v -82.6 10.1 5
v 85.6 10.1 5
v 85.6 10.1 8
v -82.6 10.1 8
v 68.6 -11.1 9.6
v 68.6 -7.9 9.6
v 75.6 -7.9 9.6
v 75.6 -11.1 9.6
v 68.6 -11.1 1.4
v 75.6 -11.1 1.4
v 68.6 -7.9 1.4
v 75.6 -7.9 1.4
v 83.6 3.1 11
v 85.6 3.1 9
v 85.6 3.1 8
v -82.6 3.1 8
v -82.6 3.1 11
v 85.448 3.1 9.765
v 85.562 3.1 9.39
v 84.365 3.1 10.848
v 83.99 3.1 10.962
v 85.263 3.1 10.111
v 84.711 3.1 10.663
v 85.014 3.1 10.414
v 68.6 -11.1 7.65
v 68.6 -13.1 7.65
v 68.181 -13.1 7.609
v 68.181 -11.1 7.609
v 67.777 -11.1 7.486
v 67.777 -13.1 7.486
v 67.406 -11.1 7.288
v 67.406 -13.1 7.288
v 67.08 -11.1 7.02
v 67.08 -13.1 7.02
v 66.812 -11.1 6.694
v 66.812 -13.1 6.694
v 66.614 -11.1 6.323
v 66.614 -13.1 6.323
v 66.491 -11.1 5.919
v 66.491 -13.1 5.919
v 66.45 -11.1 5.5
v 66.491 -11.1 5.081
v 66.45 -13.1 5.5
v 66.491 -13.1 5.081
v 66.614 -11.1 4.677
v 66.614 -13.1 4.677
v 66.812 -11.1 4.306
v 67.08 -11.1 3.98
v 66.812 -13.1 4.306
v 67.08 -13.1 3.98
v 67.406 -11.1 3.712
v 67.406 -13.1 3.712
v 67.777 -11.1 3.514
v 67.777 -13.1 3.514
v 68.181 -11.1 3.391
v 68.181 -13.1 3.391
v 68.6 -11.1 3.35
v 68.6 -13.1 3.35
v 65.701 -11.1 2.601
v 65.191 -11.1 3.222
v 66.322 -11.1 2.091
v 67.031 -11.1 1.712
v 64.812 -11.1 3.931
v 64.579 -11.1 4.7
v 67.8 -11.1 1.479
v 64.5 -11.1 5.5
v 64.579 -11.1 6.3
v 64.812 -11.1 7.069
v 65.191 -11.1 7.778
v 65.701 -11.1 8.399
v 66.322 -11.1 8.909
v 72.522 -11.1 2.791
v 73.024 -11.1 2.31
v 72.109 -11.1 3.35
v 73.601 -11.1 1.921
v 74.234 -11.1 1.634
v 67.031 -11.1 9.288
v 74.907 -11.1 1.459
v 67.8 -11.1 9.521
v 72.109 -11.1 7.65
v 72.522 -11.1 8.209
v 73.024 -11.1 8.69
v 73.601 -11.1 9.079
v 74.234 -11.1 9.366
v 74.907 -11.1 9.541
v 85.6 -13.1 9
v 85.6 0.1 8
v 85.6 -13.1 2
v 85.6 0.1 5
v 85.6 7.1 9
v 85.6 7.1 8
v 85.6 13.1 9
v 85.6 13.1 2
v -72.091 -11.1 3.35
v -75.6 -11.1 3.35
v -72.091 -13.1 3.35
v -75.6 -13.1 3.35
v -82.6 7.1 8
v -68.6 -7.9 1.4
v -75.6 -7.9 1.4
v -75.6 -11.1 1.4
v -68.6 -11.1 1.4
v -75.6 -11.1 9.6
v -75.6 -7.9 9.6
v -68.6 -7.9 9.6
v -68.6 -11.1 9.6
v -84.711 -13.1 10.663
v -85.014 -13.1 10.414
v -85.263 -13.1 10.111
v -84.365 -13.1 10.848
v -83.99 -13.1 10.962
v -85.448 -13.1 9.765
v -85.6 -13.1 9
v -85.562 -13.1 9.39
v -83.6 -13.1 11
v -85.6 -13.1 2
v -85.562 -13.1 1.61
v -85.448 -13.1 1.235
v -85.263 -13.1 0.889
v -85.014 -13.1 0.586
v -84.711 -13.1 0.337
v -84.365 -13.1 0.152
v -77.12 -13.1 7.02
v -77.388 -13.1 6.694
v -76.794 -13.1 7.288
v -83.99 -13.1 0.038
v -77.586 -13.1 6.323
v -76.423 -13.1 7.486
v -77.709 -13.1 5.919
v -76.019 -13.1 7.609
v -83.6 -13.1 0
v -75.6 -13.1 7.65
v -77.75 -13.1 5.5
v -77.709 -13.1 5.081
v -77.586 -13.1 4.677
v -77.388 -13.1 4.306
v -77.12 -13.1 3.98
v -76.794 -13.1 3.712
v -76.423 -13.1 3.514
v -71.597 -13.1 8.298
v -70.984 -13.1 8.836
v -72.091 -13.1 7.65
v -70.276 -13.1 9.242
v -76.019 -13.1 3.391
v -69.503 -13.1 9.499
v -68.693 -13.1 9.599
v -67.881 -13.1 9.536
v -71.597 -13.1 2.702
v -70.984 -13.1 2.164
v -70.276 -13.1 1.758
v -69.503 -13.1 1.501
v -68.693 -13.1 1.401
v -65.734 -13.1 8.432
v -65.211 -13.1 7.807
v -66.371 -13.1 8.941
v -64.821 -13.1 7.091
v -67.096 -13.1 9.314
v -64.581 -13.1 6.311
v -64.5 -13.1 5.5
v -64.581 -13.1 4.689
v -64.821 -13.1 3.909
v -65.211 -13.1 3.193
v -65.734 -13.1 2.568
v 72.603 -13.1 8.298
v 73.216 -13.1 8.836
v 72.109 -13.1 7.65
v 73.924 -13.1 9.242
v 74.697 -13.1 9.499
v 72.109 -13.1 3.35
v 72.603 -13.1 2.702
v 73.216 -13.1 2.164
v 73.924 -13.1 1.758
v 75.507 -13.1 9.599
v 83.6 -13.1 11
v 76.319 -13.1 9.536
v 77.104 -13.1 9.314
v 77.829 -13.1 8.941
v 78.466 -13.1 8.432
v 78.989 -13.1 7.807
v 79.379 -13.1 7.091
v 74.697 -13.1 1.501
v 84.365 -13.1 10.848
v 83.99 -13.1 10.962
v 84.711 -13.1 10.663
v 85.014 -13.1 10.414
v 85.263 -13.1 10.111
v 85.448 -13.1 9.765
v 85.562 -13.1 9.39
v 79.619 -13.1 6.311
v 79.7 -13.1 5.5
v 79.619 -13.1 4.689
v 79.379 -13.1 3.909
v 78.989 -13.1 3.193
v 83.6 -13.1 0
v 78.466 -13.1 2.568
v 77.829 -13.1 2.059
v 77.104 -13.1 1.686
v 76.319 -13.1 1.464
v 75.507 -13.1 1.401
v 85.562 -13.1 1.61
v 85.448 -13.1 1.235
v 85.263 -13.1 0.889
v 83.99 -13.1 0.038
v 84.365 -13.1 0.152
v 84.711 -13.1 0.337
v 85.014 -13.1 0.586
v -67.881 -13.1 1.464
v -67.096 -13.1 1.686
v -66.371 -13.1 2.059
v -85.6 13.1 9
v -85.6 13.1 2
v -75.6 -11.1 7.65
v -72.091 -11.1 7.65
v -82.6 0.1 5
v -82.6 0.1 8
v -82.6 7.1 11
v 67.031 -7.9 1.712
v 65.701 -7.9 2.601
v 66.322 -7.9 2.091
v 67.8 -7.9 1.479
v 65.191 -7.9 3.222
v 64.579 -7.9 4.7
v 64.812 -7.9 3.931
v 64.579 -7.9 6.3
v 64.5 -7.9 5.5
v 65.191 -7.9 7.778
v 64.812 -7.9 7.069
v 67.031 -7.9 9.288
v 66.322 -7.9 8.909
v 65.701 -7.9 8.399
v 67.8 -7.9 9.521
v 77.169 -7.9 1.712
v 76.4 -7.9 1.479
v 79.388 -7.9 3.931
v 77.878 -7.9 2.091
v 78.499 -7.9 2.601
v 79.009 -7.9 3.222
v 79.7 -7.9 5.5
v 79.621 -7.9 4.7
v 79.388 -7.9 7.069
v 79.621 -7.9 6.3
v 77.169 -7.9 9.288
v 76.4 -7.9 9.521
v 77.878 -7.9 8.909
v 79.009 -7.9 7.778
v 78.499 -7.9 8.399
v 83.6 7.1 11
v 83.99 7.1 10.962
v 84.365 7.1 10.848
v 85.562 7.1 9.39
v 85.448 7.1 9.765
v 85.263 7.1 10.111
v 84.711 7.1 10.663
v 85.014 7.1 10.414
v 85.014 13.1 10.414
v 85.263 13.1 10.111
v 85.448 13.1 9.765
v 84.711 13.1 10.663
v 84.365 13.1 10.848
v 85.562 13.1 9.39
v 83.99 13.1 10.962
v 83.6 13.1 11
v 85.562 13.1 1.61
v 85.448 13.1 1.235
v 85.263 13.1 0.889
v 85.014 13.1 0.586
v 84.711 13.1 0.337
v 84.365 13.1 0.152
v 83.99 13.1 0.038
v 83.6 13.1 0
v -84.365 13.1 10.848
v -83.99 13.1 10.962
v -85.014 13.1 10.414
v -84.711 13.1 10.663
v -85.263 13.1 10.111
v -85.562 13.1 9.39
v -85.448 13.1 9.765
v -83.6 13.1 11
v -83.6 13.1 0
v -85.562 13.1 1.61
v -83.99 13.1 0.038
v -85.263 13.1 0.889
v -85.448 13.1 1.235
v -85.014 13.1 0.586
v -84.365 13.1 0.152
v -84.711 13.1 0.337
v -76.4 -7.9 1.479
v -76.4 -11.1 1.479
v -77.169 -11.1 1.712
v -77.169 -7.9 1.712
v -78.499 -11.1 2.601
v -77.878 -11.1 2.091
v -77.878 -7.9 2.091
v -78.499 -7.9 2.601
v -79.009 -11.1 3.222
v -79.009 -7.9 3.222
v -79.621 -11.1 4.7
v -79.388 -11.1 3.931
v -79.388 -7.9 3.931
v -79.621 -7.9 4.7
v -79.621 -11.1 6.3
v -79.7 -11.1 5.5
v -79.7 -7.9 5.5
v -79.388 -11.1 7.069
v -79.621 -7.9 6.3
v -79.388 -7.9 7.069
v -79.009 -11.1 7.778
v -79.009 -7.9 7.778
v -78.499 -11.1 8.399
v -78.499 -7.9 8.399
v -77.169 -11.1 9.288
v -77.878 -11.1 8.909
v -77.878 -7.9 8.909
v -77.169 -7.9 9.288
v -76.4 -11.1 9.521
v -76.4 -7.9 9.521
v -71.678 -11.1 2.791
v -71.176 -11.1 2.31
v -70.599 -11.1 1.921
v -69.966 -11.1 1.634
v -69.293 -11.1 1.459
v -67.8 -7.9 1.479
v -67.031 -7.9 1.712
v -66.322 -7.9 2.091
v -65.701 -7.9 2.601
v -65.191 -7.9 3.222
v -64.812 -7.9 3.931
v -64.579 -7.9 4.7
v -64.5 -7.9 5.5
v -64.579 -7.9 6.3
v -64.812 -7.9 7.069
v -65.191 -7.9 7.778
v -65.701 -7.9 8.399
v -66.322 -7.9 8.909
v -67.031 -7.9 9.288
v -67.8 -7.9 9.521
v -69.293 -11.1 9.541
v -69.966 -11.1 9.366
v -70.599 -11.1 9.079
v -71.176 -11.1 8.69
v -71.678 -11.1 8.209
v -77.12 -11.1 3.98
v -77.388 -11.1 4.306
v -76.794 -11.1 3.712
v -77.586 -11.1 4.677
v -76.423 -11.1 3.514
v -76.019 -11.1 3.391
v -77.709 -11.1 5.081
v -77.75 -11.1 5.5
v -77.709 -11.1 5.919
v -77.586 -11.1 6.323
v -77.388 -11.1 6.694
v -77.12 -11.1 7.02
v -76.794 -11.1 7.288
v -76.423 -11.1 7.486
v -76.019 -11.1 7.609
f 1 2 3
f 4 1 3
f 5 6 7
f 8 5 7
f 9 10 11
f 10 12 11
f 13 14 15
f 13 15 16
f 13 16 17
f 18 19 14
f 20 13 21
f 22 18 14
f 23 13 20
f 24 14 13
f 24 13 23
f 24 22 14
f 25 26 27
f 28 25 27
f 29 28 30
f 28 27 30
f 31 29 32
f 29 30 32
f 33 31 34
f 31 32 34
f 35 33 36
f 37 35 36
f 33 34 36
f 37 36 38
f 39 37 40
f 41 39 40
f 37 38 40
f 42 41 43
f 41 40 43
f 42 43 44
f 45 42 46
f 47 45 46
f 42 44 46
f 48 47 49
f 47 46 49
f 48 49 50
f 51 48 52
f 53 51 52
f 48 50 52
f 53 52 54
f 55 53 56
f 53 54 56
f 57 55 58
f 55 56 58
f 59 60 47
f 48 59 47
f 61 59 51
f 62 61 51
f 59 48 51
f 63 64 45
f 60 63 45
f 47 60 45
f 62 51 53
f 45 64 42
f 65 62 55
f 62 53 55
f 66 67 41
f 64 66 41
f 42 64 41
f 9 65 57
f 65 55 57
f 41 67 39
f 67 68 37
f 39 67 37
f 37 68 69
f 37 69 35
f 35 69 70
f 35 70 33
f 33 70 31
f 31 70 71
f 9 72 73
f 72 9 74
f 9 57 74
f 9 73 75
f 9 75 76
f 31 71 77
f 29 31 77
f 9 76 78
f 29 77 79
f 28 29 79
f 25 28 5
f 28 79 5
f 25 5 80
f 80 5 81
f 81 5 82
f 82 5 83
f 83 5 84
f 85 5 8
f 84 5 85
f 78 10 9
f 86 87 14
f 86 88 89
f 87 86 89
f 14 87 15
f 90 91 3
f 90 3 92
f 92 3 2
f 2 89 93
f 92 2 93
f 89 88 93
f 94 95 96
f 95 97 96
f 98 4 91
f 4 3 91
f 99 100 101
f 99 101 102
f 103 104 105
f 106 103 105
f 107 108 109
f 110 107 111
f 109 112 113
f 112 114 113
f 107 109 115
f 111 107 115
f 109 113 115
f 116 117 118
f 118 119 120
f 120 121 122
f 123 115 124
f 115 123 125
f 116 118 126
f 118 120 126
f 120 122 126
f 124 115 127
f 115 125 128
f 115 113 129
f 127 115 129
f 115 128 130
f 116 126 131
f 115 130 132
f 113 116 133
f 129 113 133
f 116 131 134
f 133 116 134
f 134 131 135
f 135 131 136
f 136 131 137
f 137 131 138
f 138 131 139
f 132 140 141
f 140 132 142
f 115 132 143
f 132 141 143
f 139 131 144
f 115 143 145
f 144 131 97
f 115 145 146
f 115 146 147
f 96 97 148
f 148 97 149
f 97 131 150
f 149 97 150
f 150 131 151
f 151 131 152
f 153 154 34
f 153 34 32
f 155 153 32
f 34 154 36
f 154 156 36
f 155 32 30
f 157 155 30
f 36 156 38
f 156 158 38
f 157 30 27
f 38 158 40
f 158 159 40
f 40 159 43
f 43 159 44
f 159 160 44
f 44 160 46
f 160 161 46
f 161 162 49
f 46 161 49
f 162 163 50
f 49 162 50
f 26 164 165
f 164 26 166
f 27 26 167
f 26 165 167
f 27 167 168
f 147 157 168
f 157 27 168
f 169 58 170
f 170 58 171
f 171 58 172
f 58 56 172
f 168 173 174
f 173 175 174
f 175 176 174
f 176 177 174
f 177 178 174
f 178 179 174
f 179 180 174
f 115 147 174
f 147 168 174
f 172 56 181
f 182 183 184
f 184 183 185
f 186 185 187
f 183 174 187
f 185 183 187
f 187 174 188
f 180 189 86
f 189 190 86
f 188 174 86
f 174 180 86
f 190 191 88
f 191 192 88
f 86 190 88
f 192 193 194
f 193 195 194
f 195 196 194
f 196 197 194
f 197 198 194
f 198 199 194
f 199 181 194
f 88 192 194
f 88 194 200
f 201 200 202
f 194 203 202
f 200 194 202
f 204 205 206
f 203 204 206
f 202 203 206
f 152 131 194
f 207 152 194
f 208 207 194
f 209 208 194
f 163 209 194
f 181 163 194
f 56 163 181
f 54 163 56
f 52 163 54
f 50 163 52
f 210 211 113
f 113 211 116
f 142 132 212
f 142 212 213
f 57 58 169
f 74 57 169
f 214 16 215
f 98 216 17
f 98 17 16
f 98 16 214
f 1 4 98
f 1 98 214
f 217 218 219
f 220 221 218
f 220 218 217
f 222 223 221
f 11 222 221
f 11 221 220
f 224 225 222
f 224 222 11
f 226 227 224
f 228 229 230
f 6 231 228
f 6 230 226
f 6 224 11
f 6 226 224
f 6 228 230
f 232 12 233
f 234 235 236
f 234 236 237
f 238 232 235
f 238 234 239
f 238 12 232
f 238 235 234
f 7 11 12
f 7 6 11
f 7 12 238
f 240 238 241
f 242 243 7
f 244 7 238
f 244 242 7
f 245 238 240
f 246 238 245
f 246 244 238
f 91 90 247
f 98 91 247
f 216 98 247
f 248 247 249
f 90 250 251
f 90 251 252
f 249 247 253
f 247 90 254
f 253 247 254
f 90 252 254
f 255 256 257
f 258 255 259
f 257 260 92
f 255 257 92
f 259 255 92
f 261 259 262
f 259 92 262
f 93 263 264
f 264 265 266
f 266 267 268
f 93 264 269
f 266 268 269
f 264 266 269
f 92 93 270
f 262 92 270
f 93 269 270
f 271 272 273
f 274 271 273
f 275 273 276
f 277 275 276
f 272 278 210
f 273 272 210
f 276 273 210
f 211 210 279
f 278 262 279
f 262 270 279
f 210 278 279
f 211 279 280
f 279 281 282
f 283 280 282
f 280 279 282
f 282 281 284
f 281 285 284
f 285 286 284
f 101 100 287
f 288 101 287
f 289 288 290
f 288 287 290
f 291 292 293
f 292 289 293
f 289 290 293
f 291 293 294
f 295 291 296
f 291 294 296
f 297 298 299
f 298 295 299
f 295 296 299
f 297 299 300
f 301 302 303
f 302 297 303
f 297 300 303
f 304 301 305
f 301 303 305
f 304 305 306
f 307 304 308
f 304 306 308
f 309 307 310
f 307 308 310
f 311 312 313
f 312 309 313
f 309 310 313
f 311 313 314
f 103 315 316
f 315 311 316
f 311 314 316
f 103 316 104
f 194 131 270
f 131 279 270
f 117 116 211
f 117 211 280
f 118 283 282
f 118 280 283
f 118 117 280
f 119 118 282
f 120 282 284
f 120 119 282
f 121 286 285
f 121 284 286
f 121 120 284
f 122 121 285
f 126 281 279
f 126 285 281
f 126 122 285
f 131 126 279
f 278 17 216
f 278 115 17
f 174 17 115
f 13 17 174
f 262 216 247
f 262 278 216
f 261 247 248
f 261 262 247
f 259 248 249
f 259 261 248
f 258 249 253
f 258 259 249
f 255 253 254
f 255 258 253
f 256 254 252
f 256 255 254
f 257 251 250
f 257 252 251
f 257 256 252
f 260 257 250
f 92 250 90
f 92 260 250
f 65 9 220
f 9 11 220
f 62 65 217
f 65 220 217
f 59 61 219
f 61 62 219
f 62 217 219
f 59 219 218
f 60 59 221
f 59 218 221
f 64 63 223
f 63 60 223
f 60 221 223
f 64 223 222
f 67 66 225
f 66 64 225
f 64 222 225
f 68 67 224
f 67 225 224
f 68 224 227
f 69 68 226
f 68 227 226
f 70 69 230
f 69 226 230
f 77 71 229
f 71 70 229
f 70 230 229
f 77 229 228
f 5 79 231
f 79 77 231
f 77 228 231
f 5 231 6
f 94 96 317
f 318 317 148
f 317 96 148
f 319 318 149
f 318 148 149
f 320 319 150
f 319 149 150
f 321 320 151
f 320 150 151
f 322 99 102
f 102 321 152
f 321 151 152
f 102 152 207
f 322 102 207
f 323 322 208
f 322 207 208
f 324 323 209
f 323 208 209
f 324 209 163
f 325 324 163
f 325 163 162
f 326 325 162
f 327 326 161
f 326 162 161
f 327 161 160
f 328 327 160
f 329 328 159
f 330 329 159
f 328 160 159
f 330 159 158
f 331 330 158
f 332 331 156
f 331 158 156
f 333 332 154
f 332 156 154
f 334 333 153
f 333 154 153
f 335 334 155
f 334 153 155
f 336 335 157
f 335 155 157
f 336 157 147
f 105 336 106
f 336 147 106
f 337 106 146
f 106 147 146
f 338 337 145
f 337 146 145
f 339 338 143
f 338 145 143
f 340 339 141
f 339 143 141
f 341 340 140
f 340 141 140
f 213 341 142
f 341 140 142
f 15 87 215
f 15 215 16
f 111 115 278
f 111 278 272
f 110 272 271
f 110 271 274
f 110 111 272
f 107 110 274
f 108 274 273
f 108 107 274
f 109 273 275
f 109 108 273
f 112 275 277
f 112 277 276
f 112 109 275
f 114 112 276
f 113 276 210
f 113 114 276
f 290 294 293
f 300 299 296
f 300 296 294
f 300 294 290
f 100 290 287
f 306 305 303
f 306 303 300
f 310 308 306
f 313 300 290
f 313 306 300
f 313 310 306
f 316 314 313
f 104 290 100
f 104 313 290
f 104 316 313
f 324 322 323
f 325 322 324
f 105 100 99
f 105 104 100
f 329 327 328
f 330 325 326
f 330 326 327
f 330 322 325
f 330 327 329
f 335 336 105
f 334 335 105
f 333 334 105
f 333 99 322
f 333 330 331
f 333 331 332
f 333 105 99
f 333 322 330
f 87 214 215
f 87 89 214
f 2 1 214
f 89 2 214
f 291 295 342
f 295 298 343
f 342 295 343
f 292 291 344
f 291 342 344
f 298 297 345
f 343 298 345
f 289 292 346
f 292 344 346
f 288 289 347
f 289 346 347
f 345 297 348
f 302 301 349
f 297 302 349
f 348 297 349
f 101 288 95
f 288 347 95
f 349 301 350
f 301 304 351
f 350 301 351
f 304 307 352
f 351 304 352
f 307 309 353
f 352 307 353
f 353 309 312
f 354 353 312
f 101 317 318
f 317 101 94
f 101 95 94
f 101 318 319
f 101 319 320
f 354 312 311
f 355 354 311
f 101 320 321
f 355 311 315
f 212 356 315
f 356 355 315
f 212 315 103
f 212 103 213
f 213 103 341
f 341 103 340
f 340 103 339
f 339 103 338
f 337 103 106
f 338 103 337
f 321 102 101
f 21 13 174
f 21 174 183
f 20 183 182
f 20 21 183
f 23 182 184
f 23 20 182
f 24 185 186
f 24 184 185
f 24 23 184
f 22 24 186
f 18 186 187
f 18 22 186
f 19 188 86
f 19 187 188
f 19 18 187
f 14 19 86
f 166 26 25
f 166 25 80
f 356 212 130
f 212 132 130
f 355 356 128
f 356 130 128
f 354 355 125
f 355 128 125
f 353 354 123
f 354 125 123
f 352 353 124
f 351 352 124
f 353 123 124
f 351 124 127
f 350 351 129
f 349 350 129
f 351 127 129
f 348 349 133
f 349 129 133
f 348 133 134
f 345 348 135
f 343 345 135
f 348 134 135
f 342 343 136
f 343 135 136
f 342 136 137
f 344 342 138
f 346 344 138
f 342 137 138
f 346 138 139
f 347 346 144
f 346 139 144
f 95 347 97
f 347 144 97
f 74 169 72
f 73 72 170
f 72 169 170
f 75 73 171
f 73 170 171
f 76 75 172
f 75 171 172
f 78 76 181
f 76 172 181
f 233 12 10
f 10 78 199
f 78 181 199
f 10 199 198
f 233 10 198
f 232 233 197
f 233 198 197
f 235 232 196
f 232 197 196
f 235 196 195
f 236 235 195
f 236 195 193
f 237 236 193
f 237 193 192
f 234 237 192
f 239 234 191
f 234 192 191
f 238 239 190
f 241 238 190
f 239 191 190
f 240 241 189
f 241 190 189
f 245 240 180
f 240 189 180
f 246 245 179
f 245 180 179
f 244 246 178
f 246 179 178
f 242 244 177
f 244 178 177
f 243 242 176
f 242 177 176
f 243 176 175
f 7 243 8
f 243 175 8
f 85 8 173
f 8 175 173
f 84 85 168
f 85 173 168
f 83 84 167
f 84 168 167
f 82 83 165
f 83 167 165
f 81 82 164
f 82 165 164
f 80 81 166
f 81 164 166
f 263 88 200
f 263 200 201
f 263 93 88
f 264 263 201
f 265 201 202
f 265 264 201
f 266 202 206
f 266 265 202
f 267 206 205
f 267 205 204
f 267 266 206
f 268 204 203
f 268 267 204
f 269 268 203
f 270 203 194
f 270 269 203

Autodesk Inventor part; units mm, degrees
ref_plane "YZ Plane" through (0, 0, 0) normal (1, 0, 0) x (0, 1, 0)
ref_plane "XZ Plane" through (0, 0, 0) normal (0, 1, 0) x (-1, 0, 0)
ref_plane "XY Plane" through (0, 0, 0) normal (0, 0, 1) x (1, 0, 0)
sketch "Sketch1" plane through (0, 0, 0) normal (0, 0, 1) x (1, 0, 0)
  line L0 (85.6, 13.1) -> (-85.6, 13.1)
  line L1 (-85.6, 13.1) -> (-85.6, -13.1)
  line L2 (-85.6, -13.1) -> (85.6, -13.1)
  line L3 (85.6, -13.1) -> (85.6, 13.1)
  line L4 (85.6, 13.1) -> (-85.6, -13.1) construction
  line L5 (-85.6, 13.1) -> (85.6, -13.1) construction
  point P0 (0, 0)
  dimension "d0" = 171.2
  dimension "d1" = 26.2
extrude "Extrusion1" add sketch "Sketch1" along normal blind 11
sketch "Sketch2" plane through (85.6, -13.1, 0) normal (1, 0, 0) x (0, 0, -1)
  line L0 (0, 0) -> (0, 26.2) projected
  line L1 (0, 26.2) -> (-11, 26.2) projected
  line L2 (-11, 0) -> (-11, 26.2) projected
  line L3 (0, 0) -> (-11, 0) projected
  line L4 (-11, 26.2) -> (-11, 0) projected
  line L5 (-11, 26.2) -> (-5, 26.2)
  line L6 (-5, 26.2) -> (-5, 23.2)
  line L7 (-5, 23.2) -> (-11, 23.2)
  line L8 (-11, 23.2) -> (-11, 26.2)
  line L9 (-11, 23.2) -> (-8, 23.2)
  line L10 (-8, 23.2) -> (-8, 20.2)
  line L11 (-8, 20.2) -> (-11, 20.2)
  line L12 (-11, 20.2) -> (-11, 23.2)
  line L13 (-11, 26.2) -> (-5, 26.2)
  line L14 (-5, 26.2) -> (-5, 10.2)
  line L15 (-5, 10.2) -> (-11, 10.2)
  line L16 (-11, 10.2) -> (-11, 26.2)
  line L17 (-11, 10.2) -> (-5, 10.2)
  line L18 (-5, 10.2) -> (-5, 13.2)
  line L19 (-5, 13.2) -> (-11, 13.2)
  line L20 (-11, 13.2) -> (-11, 10.2)
  line L21 (-11, 13.2) -> (-8, 13.2)
  line L22 (-8, 13.2) -> (-8, 16.2)
  line L23 (-8, 16.2) -> (-11, 16.2)
  line L24 (-11, 16.2) -> (-11, 13.2)
  point P0 (0, 13.1)
  point P1 (-11, 20.2)
  dimension "d4" = 6
  dimension "d5" = 3
  dimension "d6" = 3
  dimension "d7" = 3
  dimension "d8" = 16
  dimension "d9" = 3
  dimension "d10" = 3
  dimension "d11" = 3
extrude "Extrusion2" cut sketch "Sketch2" against normal blind 168.2 contours L14 L19 L22 L23 L2 L11 L10 L7
fillet "Fillet1" radius 2 5 edges at (85.6, 10.1, 11) (85.6, -5, 11) (-85.6, 0, 11) (85.6, 0, 0) (-85.6, 0, 0)
sketch "Sketch4" plane through (-83.6, -13.1, 0) normal (0, -1, 0) x (1, 0, 0)
  arc A0 (-2, 2) -> (0, 0) centre (0, 2) ccw projected
  line L0 (0, 0) -> (167.2, 0) projected
  arc A1 (167.2, 0) -> (169.2, 2) centre (167.2, 2) ccw projected
  line L1 (169.2, 2) -> (169.2, 9) projected
  arc A2 (169.2, 9) -> (167.2, 11) centre (167.2, 9) ccw projected
  line L2 (0, 11) -> (167.2, 11) projected
  arc A3 (0, 11) -> (-2, 9) centre (0, 9) ccw projected
  line L3 (-2, 2) -> (-2, 9) projected
  circle A4 centre (159.2, 5.5) radius 4.1
  circle A5 centre (152.2, 5.5) radius 2.15
  line L4 (152.2, 7.65) -> (155.7089, 7.65)
  line L5 (152.2, 3.35) -> (155.7089, 3.35)
  circle A6 centre (15, 5.5) radius 4.1
  circle A7 centre (8, 5.5) radius 2.15
  line L6 (8, 3.35) -> (11.5089, 3.35)
  line L7 (8, 7.65) -> (11.5089, 7.65)
  point P0 (83.6, 0)
  point P1 (169.2, 5.5)
  point P2 (12.2407, 8.5325)
  point P3 (8.4381, 3.3951)
  point P4 (11.1965, 3.9692)
  point P5 (-2, 5.5)
  dimension "d19" = 8.2
  dimension "d20" = 4.3
  dimension "d21" = 7
  dimension "d22" = 0
  dimension "d23" = 10
  dimension "d24" = 8.2
  dimension "d25" = 4.3
  dimension "d26" = 7
  dimension "d27" = 10
  dimension "d28" = 0
  dimension "d40" = 0
extrude "Extrusion4" cut sketch "Sketch4" against normal blind 5.2 contours A4 | A4 L5 A5 L4 | A5 | A6 | A6 L6 A7 L7 | A7
sketch "Sketch5" plane through (-83.6, -13.1, 0) normal (0, -1, 0) x (1, 0, 0)
  arc A0 (8, 7.65) -> (8, 3.35) centre (8, 5.5) ccw projected
  arc A1 (11.5089, 3.35) -> (11.5089, 7.65) centre (15, 5.5) ccw projected
  arc A2 (152.2, 7.65) -> (152.2, 3.35) centre (152.2, 5.5) ccw projected
  line L0 (152.2, 7.65) -> (155.7089, 7.65) projected
  arc A3 (155.7089, 3.35) -> (155.7089, 7.65) centre (159.2, 5.5) ccw projected
  line L1 (155.7089, 3.35) -> (152.2, 3.35) projected
  arc A4 (-2, 2) -> (0, 0) centre (0, 2) ccw projected
  line L2 (0, 0) -> (167.2, 0) projected
  arc A5 (167.2, 0) -> (169.2, 2) centre (167.2, 2) ccw projected
  line L3 (169.2, 2) -> (169.2, 9) projected
  arc A6 (169.2, 9) -> (167.2, 11) centre (167.2, 9) ccw projected
  line L4 (0, 11) -> (167.2, 11) projected
  arc A7 (0, 11) -> (-2, 9) centre (0, 9) ccw projected
  line L5 (-2, 2) -> (-2, 9) projected
  circle A8 centre (8, 5.5) radius 4.1
  line L6 (8, 9.6) -> (15, 9.6)
  line L7 (8, 1.4) -> (15, 1.4)
  arc A9 (11.5089, 3.35) -> (11.5089, 7.65) centre (15, 5.5) ccw projected
  circle A10 centre (152.2, 5.5) radius 4.1
  line L8 (152.2, 9.6) -> (159.2, 9.6)
  line L9 (159.2, 1.4) -> (152.2, 1.4)
  line L10 (8, 7.65) -> (11.5089, 7.65) projected
  line L11 (11.5089, 3.35) -> (8, 3.35) projected
  arc A11 (8, 7.65) -> (8, 3.35) centre (8, 5.5) ccw projected
  point P0 (83.6, 0)
  point P1 (19.1, 5.5)
  point P2 (19.1, 5.5)
  point P3 (5.85, 5.5)
  point P4 (150.05, 5.5)
  point P5 (12.4867, 2.2607)
  point P6 (12.4867, 8.7393)
  point P7 (96.275, 2.2698)
  point P8 (96.275, 8.7302)
  point P9 (5.85, 5.5)
  point P10 (155.6911, 7.65)
  point P11 (155.6911, 3.35)
  point P12 (11.4911, 3.35)
  point P13 (11.4911, 7.65)
  dimension "d32" = 8.2
  dimension "d33" = 0
  dimension "d35" = 8.2
  dimension "d36" = 0
  dimension "d42" = 0
  dimension "d43" = 0
extrude "Extrusion5" cut sketch "Sketch5" along normal blind 3.2 from surface at -5.2 contours L10 A8 L11 A0 | A0 L11 A8 L10 | A8 L6 A1 L10 | L11 A1 L7 A8 | L0 A10 L1 A2 | A2 L1 A10 L0 | A10 L8 A3 L0 | L1 A3 L9 A10
properties part number "module-slot" material "PC/ABS Plastic"
